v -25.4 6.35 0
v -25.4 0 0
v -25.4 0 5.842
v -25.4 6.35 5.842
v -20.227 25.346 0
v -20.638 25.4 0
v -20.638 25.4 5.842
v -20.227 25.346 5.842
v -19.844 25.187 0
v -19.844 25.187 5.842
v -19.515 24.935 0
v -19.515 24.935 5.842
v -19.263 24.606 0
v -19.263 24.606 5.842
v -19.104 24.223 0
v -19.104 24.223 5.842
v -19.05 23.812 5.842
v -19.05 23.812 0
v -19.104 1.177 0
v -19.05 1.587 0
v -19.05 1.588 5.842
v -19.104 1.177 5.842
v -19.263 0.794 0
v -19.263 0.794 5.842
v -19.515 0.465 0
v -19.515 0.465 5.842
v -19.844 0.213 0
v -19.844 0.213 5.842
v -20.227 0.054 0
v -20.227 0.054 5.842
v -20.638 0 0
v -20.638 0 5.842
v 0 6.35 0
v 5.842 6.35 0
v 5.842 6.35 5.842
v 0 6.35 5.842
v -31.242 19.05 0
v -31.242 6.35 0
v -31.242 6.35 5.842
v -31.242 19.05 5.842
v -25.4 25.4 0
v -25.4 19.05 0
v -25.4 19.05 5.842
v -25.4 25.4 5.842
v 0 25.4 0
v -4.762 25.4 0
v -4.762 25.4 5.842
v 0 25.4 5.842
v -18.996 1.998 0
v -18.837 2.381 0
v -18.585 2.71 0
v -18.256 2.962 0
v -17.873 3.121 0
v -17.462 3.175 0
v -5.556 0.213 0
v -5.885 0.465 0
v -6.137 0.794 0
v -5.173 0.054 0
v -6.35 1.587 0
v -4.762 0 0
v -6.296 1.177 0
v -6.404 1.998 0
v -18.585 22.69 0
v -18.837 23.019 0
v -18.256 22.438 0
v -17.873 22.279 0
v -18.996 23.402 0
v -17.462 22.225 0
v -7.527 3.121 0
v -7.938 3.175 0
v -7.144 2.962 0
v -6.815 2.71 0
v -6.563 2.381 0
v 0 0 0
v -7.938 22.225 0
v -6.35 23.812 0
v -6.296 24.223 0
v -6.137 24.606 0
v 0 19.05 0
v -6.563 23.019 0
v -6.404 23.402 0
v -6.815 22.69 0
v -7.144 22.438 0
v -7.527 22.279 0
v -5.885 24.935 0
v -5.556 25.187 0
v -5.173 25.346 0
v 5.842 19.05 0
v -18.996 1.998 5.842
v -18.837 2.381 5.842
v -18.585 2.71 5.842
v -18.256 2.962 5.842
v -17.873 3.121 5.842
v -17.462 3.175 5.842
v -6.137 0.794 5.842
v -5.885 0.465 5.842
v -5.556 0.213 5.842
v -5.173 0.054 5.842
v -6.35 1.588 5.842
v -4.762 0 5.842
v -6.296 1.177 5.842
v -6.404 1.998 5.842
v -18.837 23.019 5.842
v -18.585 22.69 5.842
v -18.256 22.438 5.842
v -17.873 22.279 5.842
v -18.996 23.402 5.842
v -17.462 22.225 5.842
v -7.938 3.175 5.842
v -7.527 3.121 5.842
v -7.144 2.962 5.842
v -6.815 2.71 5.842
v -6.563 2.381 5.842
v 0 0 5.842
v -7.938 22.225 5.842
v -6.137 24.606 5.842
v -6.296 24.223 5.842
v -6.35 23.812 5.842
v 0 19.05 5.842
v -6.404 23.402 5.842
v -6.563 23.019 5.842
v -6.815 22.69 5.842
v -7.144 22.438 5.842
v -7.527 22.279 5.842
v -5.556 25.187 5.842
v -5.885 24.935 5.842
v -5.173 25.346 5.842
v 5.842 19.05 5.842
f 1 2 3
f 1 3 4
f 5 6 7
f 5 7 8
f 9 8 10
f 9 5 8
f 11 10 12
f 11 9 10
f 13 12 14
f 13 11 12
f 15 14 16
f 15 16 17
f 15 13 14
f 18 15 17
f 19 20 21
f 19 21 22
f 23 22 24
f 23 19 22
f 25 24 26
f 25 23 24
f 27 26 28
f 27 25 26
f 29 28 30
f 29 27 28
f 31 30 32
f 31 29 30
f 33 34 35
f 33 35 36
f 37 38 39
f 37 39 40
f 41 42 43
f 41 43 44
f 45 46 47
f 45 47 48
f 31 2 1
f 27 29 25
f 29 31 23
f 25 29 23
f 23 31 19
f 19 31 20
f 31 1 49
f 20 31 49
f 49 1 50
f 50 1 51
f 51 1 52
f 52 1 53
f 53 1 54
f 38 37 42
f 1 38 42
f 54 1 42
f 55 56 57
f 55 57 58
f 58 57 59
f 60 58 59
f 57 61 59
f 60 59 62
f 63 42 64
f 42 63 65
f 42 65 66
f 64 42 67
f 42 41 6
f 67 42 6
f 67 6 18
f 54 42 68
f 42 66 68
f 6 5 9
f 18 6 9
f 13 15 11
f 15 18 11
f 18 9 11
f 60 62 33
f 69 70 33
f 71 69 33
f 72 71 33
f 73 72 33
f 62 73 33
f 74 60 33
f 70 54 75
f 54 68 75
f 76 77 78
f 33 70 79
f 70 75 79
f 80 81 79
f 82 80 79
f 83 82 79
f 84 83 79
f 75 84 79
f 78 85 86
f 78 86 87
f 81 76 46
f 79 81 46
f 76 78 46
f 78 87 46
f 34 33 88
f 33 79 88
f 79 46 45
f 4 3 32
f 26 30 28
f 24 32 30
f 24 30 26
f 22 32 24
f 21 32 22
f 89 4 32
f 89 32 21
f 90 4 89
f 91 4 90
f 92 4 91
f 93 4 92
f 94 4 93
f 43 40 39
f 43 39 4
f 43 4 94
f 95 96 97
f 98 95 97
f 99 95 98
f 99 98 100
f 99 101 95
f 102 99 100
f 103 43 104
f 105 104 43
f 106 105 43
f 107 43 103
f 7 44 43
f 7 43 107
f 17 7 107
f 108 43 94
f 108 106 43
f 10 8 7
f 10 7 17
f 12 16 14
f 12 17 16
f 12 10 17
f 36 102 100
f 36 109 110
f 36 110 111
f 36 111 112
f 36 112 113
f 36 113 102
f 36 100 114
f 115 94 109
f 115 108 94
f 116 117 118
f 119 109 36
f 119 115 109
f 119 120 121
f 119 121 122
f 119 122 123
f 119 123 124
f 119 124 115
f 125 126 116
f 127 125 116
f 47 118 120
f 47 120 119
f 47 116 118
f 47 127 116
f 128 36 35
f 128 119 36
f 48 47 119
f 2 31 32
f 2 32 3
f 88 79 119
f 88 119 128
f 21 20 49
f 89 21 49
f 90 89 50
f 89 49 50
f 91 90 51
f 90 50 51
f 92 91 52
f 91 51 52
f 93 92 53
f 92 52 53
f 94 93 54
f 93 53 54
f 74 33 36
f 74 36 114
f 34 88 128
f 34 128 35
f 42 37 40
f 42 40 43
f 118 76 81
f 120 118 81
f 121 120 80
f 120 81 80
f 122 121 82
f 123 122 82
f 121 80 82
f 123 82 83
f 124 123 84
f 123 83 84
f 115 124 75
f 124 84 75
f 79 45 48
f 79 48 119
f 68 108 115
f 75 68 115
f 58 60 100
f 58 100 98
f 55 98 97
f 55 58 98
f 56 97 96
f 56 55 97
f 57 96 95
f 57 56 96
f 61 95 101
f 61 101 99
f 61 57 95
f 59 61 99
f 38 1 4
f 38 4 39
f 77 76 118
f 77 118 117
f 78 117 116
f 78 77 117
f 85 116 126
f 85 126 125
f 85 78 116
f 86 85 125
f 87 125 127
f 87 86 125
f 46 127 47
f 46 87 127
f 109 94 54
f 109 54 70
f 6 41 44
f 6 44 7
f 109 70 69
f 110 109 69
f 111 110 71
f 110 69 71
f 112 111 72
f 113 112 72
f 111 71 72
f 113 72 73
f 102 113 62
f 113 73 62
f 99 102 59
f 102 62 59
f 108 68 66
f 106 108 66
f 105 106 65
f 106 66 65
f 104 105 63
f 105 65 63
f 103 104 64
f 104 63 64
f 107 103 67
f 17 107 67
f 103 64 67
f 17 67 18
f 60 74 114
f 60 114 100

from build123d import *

# Parameters (mm, degrees)
BOSS_EXTRUDE1_DEPTH = 5.842
SKETCH2_W           = 12.7
SKETCH2_H           = 3.175
CUT_EXTRUDE1_DEPTH  = 41.686011454
FILLET1_START       = -1
FILLET1_DEPTH       = 8
FILLET1_2_DEPTH     = 5.842


with BuildPart() as part:
    # Sketch1 → Boss-Extrude1 (new body)
    with BuildSketch(Plane.XY):
        Polygon((0, 0), (-25.4, 0), (-25.4, 6.35), (-31.242, 6.35), (-31.242, 19.05), (-25.4, 19.05), (-25.4, 25.4), (0, 25.4), (0, 19.05), (5.842, 19.05), (5.842, 6.35), (0, 6.35), align=None)
    extrude(amount=BOSS_EXTRUDE1_DEPTH)

    # Sketch2 → Cut-Extrude1 (cut, through all)
    with BuildSketch(Plane.XY.offset(5.842)):
        with Locations((-12.7, 23.8125)):
            Rectangle(SKETCH2_W, SKETCH2_H)
        with Locations((-12.7, 1.5875)):
            Rectangle(SKETCH2_W, SKETCH2_H)
    extrude(amount=-CUT_EXTRUDE1_DEPTH, mode=Mode.SUBTRACT)

    # Fillet1: read off the stored shape, not the designer's step
    # Fillet1 outline → Fillet1 (cut)
    with BuildSketch(Plane.XY.offset(FILLET1_START)):
        with BuildLine():
            ThreePointArc((-20.6375, 25.4), (-19.514967985, 24.935032015), (-19.05, 23.8125))
            Line((-19.05, 23.8125), (-19.05, 25.4))
            Line((-19.05, 25.4), (-20.6375, 25.4))
        make_face()
        with BuildLine():
            Line((-6.35, 25.4), (-6.35, 23.8125))
            ThreePointArc((-6.35, 23.8125), (-5.885032015, 24.935032015), (-4.7625, 25.4))
            Line((-4.7625, 25.4), (-6.35, 25.4))
        make_face()
        with BuildLine():
            ThreePointArc((-4.7625, 0), (-5.885032015, 0.464967985), (-6.35, 1.5875))
            Line((-6.35, 1.5875), (-6.35, 0))
            Line((-6.35, 0), (-4.7625, 0))
        make_face()
        with BuildLine():
            Line((-19.05, 0), (-19.05, 1.5875))
            ThreePointArc((-19.05, 1.5875), (-19.514967985, 0.464967985), (-20.6375, 0))
            Line((-20.6375, 0), (-19.05, 0))
        make_face()
    extrude(amount=FILLET1_DEPTH, mode=Mode.SUBTRACT)

    # Fillet1 2 outline → Fillet1 2 (add)
    with BuildSketch(Plane.XY):
        with BuildLine():
            Line((-19.05, 22.225), (-17.4625, 22.225))
            ThreePointArc((-17.4625, 22.225), (-18.585032015, 22.689967985), (-19.05, 23.8125))
            Line((-19.05, 23.8125), (-19.05, 22.225))
        make_face()
        with BuildLine():
            ThreePointArc((-6.35, 23.8125), (-6.814967985, 22.689967985), (-7.9375, 22.225))
            Line((-7.9375, 22.225), (-6.35, 22.225))
            Line((-6.35, 22.225), (-6.35, 23.8125))
        make_face()
        with BuildLine():
            Line((-6.35, 3.175), (-7.9375, 3.175))
            ThreePointArc((-7.9375, 3.175), (-6.814967985, 2.710032015), (-6.35, 1.5875))
            Line((-6.35, 1.5875), (-6.35, 3.175))
        make_face()
        with BuildLine():
            ThreePointArc((-19.05, 1.5875), (-18.585032015, 2.710032015), (-17.4625, 3.175))
            Line((-17.4625, 3.175), (-19.05, 3.175))
            Line((-19.05, 3.175), (-19.05, 1.5875))
        make_face()
    extrude(amount=FILLET1_2_DEPTH)


solid = part.part
